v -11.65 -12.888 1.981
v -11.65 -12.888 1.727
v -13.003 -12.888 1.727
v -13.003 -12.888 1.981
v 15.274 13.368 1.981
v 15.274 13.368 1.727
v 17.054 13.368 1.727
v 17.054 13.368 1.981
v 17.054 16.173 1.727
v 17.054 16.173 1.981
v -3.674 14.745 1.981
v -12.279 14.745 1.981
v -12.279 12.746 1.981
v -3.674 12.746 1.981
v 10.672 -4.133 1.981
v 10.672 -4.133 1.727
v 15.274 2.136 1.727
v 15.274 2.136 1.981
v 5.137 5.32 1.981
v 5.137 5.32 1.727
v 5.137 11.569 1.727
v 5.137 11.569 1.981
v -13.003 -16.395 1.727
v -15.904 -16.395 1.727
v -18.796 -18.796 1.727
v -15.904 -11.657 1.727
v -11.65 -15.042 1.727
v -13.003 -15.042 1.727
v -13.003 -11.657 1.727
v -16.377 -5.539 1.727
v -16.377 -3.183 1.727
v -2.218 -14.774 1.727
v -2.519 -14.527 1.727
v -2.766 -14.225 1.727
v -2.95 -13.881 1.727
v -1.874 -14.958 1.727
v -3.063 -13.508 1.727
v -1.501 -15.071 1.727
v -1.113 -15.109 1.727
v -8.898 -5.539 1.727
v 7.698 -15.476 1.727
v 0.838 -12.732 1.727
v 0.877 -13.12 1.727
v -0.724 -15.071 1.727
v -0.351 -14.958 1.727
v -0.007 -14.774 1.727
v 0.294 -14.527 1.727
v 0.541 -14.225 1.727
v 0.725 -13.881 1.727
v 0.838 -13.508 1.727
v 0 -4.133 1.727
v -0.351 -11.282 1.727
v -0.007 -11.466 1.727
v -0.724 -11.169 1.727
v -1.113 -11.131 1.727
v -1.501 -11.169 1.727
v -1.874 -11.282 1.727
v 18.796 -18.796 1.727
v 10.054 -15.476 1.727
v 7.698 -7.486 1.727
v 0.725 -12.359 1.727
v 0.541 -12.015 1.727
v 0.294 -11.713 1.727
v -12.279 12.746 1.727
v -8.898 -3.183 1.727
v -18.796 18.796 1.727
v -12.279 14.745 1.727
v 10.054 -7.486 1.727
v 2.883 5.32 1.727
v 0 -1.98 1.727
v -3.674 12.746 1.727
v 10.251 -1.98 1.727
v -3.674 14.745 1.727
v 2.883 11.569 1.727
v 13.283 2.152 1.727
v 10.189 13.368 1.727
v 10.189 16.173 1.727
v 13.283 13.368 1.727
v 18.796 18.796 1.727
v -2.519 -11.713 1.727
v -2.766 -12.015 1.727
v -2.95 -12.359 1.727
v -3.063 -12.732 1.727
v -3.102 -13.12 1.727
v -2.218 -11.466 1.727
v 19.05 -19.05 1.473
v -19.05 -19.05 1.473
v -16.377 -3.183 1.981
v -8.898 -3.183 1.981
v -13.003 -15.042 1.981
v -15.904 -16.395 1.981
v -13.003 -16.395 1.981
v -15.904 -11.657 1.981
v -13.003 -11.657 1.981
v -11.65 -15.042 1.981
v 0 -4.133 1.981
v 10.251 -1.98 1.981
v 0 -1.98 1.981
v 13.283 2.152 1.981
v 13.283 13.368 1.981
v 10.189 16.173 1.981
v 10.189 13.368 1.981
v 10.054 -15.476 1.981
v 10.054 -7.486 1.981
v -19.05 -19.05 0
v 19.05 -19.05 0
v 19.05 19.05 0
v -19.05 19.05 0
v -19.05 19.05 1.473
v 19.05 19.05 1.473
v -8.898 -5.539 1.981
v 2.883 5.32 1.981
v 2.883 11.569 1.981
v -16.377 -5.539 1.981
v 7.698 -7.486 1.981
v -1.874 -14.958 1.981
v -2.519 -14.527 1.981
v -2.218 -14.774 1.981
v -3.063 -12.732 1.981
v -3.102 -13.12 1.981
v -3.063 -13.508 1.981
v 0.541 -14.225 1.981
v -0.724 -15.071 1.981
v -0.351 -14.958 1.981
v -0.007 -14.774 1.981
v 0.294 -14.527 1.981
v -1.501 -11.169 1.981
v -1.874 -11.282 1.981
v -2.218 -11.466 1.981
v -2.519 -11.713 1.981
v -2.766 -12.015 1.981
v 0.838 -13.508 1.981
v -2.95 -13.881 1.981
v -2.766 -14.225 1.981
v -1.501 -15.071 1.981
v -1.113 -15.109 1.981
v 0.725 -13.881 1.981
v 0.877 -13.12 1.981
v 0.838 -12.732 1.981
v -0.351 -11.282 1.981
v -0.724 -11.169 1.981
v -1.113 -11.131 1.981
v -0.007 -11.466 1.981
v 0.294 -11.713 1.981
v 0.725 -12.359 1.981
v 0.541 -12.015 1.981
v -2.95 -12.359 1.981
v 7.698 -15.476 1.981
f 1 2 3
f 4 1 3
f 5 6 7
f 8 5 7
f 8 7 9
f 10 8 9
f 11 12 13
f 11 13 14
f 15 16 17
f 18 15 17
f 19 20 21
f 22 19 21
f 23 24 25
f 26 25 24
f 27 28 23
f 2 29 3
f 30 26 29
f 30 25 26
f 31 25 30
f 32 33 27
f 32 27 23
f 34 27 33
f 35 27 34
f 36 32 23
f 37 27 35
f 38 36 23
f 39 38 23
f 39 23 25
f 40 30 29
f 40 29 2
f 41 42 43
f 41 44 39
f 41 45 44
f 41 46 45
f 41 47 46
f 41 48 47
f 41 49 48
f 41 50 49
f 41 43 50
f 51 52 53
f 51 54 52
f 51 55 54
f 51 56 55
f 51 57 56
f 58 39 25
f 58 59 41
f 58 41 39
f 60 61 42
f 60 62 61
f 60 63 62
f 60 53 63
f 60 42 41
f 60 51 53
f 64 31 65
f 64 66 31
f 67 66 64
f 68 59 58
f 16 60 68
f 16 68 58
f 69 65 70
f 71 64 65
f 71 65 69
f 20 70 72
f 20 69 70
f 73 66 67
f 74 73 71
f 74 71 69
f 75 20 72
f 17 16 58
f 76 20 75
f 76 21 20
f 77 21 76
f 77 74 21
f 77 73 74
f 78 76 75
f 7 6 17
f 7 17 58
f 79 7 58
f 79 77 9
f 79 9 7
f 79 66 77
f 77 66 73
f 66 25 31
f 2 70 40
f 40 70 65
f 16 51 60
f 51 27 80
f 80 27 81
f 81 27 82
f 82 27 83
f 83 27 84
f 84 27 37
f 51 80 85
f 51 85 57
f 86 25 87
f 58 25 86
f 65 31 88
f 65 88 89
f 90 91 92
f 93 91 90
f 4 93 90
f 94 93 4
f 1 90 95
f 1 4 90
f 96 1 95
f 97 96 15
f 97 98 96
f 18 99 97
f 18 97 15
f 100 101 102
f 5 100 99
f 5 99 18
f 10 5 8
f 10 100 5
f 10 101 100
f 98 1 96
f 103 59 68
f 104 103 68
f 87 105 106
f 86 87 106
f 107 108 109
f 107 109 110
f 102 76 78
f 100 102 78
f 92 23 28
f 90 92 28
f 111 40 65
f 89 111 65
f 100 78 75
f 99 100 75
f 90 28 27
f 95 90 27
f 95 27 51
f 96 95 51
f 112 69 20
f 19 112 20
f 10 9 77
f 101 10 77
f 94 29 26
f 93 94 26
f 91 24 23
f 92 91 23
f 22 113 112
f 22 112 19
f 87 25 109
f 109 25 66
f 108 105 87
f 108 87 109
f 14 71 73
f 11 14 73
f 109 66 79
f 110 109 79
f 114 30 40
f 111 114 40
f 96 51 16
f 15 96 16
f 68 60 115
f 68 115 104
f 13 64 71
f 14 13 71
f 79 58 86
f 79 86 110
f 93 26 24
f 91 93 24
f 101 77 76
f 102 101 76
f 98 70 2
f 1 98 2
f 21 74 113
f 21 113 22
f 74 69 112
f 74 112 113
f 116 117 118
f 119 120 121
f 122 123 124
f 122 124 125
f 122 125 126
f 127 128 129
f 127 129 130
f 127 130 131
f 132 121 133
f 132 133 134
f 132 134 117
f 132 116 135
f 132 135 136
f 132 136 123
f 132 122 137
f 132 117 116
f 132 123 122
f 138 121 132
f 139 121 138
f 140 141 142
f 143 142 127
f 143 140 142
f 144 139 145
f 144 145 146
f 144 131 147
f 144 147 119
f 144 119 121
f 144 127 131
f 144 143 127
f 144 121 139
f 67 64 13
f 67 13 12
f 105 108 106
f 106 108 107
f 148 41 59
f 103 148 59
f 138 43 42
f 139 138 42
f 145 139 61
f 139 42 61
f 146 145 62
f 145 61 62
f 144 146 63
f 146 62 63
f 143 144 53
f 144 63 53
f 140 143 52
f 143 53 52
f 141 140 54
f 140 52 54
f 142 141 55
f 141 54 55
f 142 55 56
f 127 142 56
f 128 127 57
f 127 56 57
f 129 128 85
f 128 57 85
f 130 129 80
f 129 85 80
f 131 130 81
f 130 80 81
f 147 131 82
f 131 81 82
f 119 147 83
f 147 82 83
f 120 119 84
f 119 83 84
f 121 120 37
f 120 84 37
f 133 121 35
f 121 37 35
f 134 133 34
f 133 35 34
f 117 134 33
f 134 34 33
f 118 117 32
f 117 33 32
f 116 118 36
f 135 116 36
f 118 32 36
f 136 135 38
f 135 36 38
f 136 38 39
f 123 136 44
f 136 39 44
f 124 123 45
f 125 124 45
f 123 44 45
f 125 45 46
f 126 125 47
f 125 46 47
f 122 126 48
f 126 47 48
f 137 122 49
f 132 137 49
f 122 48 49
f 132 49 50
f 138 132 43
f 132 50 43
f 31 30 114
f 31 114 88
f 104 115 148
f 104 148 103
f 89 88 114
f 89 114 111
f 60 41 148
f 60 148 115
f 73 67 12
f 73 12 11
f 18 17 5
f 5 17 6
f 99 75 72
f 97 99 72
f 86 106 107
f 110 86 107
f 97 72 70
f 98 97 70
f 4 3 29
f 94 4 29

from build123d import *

# Parameters (mm, degrees)
F0_W     = 38.1
F0_H     = 38.1
F1_DEPTH = 1.7272
F2_SIZE  = 0.254
F3_W     = 8.605414
F3_H     = 1.998895
F3_W_2   = 2.356245
F3_H_2   = 7.990742
F3_W_3   = 7.478513
F3_H_3   = 2.356244
F3_W_4   = 2.253799
F3_H_4   = 6.24917
F3_R     = 1.989131
F4_DEPTH = 0.254


with BuildPart() as f1:
    # F0 (on Top) → F1 (new body)
    with BuildSketch(Plane.XY):
        Rectangle(F0_W, F0_H)
    extrude(amount=F1_DEPTH)

    # F2
    f2_edges = [f1.edges().sort_by_distance(p)[0] for p in [
        (0, -19.05, 1.7272),
        (-19.05, 0, 1.7272),
        (0, 19.05, 1.7272),
        (19.05, 0, 1.7272),
    ]]
    chamfer(f2_edges, length=F2_SIZE)

    # F3 (on face) → F4 (join)
    with BuildSketch(Plane.XY.offset(1.7272)):
        Polygon((-13.00328, -11.657394), (-15.904149, -11.657394), (-15.904149, -16.395478), (-13.00328, -16.395478), (-13.00328, -15.04174), (-13.00328, -14.026436), (-13.00328, -12.888039), align=None)
        Polygon((-11.649542, -12.888039), (-13.00328, -12.888039), (-13.00328, -14.026436), (-11.649542, -14.026436), (0, -3.118129), (10.672469, -3.118129), (14.540292, 2.151779), (14.540292, 11.33786), (14.540292, 13.368469), (13.28325, 13.368469), (13.28325, 11.33786), (13.28325, 2.151779), (10.250947, -1.979733), (0, -1.979733), align=None)
        Polygon((-11.649542, -14.026436), (-13.00328, -14.026436), (-13.00328, -15.04174), (-11.649542, -15.04174), (0, -4.133433), (10.672469, -4.133433), (15.274137, 2.136338), (15.274137, 11.51581), (15.274137, 13.368469), (14.540292, 13.368469), (14.540292, 11.33786), (14.540292, 2.151779), (10.672469, -3.118129), (0, -3.118129), align=None)
        Polygon((12.026207, 13.368469), (13.28325, 13.368469), (14.540292, 13.368469), (15.274137, 13.368469), (17.054377, 13.368469), (17.054377, 16.17264), (10.188991, 16.17264), (10.188991, 13.368469), align=None)
        with Locations((-7.976379, 13.745683)):
            Rectangle(F3_W, F3_H)
        with Locations((8.875891, -11.480894)):
            Rectangle(F3_W_2, F3_H_2)
        with Locations((-12.637645, -4.360938)):
            Rectangle(F3_W_3, F3_H_3)
        with Locations((4.009735, 8.444738)):
            Rectangle(F3_W_4, F3_H_4)
        with Locations((-1.112536, -13.120022)):
            Circle(F3_R)
    extrude(amount=F4_DEPTH)


solid = f1.part
